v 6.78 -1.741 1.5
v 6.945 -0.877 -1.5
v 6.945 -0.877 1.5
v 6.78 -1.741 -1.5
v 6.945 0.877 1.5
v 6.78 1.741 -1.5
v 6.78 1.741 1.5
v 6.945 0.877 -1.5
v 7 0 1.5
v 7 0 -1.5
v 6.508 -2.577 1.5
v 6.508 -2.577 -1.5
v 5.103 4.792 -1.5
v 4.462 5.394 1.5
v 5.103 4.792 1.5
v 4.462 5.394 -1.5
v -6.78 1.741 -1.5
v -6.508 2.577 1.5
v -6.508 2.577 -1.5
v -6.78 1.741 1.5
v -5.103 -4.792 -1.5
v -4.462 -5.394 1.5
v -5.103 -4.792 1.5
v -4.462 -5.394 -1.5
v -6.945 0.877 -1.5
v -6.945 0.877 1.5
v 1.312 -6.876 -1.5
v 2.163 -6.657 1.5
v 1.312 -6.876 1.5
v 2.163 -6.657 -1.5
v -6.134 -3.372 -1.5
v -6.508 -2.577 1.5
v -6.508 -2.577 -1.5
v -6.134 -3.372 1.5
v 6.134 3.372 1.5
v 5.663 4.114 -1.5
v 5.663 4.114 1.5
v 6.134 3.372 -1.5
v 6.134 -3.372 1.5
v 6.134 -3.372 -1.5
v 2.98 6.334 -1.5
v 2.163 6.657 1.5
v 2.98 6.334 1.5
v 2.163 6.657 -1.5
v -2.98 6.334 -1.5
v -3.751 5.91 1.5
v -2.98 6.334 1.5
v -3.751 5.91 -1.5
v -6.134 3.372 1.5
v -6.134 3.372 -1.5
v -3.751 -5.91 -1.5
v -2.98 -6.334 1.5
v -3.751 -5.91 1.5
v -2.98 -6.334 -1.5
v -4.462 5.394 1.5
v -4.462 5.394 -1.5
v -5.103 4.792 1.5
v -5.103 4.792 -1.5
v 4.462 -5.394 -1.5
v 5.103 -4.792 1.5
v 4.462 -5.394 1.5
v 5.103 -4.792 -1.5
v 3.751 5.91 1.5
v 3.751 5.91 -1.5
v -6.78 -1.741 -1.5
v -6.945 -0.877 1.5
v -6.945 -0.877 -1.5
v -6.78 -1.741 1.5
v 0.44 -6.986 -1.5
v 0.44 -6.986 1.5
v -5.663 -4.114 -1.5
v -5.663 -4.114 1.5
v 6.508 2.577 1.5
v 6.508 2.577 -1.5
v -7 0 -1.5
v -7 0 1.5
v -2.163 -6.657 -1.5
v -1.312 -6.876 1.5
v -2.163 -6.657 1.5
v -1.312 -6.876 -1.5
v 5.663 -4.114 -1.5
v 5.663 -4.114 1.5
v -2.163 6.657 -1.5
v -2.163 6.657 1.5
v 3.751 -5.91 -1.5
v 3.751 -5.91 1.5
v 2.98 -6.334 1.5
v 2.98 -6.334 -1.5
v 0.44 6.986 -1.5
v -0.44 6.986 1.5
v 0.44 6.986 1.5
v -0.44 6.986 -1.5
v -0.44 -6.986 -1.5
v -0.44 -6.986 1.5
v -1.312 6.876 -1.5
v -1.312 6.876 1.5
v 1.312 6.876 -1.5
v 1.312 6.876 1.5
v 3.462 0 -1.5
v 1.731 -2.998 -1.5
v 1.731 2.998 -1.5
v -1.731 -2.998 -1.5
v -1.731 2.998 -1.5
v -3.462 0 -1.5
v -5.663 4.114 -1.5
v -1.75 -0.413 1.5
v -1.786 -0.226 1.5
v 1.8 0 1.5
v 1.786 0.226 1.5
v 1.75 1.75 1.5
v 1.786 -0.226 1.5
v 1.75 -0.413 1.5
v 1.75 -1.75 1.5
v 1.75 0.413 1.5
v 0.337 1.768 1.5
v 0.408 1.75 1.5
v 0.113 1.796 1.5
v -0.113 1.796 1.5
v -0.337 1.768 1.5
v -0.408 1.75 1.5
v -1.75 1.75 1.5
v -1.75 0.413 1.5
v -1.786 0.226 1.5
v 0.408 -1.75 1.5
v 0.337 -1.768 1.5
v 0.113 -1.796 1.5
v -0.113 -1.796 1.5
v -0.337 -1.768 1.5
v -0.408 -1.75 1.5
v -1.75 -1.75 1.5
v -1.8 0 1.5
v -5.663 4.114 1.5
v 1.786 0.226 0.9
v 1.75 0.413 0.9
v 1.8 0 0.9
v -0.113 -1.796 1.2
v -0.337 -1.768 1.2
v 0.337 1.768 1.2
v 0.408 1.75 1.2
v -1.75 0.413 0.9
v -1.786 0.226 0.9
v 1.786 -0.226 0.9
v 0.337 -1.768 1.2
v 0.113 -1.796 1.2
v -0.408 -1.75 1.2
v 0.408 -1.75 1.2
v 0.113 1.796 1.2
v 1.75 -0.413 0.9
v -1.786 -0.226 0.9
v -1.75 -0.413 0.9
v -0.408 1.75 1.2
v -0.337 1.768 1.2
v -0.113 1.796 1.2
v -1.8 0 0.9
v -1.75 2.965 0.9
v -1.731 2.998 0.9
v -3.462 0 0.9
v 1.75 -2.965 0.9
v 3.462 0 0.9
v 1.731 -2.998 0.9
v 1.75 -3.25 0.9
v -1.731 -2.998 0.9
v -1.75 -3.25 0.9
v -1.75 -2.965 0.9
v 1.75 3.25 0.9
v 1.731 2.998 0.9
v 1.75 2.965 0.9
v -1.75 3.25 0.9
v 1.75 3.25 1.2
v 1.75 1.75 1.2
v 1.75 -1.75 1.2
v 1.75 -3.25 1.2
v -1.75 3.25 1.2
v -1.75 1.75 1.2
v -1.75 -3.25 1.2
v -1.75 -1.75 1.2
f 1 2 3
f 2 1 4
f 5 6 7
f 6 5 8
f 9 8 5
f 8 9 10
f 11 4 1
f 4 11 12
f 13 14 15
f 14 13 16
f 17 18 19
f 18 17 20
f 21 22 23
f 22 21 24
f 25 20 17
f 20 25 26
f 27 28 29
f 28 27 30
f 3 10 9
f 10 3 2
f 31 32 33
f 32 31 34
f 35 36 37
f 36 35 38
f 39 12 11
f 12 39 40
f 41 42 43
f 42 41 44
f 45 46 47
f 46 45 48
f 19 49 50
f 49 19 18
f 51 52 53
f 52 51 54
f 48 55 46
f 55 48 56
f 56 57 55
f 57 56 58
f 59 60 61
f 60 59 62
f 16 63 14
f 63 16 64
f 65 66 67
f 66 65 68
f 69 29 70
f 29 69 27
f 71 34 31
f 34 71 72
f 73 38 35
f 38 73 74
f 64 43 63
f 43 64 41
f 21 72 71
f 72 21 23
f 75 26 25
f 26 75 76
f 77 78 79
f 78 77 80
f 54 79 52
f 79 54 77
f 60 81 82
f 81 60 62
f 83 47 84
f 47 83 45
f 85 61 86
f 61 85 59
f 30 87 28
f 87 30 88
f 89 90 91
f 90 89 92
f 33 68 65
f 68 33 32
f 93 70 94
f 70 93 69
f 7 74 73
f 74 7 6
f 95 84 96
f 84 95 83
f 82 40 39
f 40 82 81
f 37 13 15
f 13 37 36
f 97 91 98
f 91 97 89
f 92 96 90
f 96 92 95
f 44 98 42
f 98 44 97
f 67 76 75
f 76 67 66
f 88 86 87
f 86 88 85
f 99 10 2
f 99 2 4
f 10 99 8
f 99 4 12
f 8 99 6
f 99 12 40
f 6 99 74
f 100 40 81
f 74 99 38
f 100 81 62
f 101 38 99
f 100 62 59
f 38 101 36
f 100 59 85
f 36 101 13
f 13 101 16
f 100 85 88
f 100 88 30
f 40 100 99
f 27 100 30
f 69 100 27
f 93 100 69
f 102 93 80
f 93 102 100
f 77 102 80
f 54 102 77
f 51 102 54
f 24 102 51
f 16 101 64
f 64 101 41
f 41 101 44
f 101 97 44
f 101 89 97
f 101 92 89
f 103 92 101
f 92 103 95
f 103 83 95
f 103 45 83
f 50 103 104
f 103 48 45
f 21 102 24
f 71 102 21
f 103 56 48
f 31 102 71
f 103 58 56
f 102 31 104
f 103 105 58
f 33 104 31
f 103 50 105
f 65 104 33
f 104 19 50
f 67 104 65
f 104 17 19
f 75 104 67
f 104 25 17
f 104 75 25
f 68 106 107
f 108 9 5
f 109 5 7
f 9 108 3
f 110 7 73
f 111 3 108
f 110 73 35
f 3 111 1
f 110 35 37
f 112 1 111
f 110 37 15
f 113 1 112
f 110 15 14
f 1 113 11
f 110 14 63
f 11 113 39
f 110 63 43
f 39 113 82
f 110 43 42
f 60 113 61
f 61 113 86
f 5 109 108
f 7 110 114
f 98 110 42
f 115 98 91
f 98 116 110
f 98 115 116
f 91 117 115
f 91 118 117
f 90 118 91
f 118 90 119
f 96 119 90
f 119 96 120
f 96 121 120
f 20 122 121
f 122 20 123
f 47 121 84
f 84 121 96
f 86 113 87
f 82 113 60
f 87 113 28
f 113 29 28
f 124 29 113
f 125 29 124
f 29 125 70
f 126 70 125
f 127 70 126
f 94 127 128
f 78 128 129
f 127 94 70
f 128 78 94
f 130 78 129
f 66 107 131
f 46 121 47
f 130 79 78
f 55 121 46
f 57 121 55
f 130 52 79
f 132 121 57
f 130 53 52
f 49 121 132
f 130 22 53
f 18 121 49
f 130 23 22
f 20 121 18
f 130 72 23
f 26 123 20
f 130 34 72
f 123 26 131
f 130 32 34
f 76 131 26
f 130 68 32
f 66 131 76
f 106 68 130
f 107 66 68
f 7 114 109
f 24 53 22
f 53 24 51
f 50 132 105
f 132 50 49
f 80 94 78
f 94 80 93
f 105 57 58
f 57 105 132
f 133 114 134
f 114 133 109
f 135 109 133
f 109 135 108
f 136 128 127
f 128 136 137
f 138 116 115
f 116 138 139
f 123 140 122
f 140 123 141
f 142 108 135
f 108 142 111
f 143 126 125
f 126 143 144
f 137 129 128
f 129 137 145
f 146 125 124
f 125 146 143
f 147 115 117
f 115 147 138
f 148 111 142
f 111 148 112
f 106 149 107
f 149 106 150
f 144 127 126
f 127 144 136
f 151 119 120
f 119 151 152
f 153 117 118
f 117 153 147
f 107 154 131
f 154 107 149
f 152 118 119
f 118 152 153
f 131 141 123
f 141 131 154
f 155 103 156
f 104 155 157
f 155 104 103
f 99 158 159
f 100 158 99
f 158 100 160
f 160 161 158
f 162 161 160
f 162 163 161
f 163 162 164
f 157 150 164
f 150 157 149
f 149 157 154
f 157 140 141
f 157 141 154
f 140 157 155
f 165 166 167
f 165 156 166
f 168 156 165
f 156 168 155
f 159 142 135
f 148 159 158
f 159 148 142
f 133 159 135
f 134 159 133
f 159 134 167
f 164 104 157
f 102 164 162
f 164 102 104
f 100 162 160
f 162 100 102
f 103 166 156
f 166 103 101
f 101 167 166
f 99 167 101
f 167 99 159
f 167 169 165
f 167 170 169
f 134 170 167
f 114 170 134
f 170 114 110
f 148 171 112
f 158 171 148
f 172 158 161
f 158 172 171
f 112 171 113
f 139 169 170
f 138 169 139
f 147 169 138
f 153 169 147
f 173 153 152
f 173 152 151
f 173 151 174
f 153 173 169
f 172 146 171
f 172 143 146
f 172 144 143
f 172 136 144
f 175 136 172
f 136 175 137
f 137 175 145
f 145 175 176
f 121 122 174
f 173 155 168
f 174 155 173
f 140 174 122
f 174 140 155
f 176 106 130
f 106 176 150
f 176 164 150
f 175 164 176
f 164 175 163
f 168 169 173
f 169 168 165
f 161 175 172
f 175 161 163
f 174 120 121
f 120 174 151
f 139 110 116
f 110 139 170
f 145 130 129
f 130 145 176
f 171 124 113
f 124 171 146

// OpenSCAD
$fn = 50;


difference() {
	union() {
		translate(v = [0, 0, -1.5000000000]) {
			rotate(a = [0, 0, 0]) {
				cylinder(h = 3, r = 7.0000000000);
			}
		}
		translate(v = [0, 0, -1.5000000000]) {
			rotate(a = [0, 0, 0]) {
				cylinder(h = 3, r = 2.8500000000);
			}
		}
	}
	union() {
		translate(v = [0, 0, -125.0000000000]) {
			rotate(a = [0, 0, 0]) {
				cylinder(h = 250, r = 1.8000000000);
			}
		}
		translate(v = [0, 0, -2.1000000000]) {
			rotate(a = [0, 0, 0]) {
				#translate(v = [0, 0, 0]) {
					rotate(a = [0, 0, 0]) {
						linear_extrude(height = 3) {
							polygon(points = [[3.4620000000, 0.0000000000], [1.7310000000, 2.9981799479], [-1.7310000000, 2.9981799479], [-3.4620000000, 0.0000000000], [-1.7310000000, -2.9981799479], [1.7310000000, -2.9981799479]]);
						}
					}
				}
			}
		}
		#translate(v = [-1.7500000000, -3.2500000000, 0.9000000000]) {
			rotate(a = [0, 0, 0]) {
				cube(size = [3.5000000000, 6.5000000000, 0.3000000000]);
			}
		}
		#translate(v = [-1.7500000000, -1.7500000000, 1.2000000000]) {
			rotate(a = [0, 0, 0]) {
				cube(size = [3.5000000000, 3.5000000000, 0.3000000000]);
			}
		}
		#translate(v = [-1.7500000000, -3.2500000000, -2.4000000000]) {
			rotate(a = [0, 0, 0]) {
				cube(size = [3.5000000000, 6.5000000000, 0.3000000000]);
			}
		}
		#translate(v = [-1.7500000000, -1.7500000000, -2.7000000000]) {
			rotate(a = [0, 0, 0]) {
				cube(size = [3.5000000000, 3.5000000000, 0.3000000000]);
			}
		}
	}
}
